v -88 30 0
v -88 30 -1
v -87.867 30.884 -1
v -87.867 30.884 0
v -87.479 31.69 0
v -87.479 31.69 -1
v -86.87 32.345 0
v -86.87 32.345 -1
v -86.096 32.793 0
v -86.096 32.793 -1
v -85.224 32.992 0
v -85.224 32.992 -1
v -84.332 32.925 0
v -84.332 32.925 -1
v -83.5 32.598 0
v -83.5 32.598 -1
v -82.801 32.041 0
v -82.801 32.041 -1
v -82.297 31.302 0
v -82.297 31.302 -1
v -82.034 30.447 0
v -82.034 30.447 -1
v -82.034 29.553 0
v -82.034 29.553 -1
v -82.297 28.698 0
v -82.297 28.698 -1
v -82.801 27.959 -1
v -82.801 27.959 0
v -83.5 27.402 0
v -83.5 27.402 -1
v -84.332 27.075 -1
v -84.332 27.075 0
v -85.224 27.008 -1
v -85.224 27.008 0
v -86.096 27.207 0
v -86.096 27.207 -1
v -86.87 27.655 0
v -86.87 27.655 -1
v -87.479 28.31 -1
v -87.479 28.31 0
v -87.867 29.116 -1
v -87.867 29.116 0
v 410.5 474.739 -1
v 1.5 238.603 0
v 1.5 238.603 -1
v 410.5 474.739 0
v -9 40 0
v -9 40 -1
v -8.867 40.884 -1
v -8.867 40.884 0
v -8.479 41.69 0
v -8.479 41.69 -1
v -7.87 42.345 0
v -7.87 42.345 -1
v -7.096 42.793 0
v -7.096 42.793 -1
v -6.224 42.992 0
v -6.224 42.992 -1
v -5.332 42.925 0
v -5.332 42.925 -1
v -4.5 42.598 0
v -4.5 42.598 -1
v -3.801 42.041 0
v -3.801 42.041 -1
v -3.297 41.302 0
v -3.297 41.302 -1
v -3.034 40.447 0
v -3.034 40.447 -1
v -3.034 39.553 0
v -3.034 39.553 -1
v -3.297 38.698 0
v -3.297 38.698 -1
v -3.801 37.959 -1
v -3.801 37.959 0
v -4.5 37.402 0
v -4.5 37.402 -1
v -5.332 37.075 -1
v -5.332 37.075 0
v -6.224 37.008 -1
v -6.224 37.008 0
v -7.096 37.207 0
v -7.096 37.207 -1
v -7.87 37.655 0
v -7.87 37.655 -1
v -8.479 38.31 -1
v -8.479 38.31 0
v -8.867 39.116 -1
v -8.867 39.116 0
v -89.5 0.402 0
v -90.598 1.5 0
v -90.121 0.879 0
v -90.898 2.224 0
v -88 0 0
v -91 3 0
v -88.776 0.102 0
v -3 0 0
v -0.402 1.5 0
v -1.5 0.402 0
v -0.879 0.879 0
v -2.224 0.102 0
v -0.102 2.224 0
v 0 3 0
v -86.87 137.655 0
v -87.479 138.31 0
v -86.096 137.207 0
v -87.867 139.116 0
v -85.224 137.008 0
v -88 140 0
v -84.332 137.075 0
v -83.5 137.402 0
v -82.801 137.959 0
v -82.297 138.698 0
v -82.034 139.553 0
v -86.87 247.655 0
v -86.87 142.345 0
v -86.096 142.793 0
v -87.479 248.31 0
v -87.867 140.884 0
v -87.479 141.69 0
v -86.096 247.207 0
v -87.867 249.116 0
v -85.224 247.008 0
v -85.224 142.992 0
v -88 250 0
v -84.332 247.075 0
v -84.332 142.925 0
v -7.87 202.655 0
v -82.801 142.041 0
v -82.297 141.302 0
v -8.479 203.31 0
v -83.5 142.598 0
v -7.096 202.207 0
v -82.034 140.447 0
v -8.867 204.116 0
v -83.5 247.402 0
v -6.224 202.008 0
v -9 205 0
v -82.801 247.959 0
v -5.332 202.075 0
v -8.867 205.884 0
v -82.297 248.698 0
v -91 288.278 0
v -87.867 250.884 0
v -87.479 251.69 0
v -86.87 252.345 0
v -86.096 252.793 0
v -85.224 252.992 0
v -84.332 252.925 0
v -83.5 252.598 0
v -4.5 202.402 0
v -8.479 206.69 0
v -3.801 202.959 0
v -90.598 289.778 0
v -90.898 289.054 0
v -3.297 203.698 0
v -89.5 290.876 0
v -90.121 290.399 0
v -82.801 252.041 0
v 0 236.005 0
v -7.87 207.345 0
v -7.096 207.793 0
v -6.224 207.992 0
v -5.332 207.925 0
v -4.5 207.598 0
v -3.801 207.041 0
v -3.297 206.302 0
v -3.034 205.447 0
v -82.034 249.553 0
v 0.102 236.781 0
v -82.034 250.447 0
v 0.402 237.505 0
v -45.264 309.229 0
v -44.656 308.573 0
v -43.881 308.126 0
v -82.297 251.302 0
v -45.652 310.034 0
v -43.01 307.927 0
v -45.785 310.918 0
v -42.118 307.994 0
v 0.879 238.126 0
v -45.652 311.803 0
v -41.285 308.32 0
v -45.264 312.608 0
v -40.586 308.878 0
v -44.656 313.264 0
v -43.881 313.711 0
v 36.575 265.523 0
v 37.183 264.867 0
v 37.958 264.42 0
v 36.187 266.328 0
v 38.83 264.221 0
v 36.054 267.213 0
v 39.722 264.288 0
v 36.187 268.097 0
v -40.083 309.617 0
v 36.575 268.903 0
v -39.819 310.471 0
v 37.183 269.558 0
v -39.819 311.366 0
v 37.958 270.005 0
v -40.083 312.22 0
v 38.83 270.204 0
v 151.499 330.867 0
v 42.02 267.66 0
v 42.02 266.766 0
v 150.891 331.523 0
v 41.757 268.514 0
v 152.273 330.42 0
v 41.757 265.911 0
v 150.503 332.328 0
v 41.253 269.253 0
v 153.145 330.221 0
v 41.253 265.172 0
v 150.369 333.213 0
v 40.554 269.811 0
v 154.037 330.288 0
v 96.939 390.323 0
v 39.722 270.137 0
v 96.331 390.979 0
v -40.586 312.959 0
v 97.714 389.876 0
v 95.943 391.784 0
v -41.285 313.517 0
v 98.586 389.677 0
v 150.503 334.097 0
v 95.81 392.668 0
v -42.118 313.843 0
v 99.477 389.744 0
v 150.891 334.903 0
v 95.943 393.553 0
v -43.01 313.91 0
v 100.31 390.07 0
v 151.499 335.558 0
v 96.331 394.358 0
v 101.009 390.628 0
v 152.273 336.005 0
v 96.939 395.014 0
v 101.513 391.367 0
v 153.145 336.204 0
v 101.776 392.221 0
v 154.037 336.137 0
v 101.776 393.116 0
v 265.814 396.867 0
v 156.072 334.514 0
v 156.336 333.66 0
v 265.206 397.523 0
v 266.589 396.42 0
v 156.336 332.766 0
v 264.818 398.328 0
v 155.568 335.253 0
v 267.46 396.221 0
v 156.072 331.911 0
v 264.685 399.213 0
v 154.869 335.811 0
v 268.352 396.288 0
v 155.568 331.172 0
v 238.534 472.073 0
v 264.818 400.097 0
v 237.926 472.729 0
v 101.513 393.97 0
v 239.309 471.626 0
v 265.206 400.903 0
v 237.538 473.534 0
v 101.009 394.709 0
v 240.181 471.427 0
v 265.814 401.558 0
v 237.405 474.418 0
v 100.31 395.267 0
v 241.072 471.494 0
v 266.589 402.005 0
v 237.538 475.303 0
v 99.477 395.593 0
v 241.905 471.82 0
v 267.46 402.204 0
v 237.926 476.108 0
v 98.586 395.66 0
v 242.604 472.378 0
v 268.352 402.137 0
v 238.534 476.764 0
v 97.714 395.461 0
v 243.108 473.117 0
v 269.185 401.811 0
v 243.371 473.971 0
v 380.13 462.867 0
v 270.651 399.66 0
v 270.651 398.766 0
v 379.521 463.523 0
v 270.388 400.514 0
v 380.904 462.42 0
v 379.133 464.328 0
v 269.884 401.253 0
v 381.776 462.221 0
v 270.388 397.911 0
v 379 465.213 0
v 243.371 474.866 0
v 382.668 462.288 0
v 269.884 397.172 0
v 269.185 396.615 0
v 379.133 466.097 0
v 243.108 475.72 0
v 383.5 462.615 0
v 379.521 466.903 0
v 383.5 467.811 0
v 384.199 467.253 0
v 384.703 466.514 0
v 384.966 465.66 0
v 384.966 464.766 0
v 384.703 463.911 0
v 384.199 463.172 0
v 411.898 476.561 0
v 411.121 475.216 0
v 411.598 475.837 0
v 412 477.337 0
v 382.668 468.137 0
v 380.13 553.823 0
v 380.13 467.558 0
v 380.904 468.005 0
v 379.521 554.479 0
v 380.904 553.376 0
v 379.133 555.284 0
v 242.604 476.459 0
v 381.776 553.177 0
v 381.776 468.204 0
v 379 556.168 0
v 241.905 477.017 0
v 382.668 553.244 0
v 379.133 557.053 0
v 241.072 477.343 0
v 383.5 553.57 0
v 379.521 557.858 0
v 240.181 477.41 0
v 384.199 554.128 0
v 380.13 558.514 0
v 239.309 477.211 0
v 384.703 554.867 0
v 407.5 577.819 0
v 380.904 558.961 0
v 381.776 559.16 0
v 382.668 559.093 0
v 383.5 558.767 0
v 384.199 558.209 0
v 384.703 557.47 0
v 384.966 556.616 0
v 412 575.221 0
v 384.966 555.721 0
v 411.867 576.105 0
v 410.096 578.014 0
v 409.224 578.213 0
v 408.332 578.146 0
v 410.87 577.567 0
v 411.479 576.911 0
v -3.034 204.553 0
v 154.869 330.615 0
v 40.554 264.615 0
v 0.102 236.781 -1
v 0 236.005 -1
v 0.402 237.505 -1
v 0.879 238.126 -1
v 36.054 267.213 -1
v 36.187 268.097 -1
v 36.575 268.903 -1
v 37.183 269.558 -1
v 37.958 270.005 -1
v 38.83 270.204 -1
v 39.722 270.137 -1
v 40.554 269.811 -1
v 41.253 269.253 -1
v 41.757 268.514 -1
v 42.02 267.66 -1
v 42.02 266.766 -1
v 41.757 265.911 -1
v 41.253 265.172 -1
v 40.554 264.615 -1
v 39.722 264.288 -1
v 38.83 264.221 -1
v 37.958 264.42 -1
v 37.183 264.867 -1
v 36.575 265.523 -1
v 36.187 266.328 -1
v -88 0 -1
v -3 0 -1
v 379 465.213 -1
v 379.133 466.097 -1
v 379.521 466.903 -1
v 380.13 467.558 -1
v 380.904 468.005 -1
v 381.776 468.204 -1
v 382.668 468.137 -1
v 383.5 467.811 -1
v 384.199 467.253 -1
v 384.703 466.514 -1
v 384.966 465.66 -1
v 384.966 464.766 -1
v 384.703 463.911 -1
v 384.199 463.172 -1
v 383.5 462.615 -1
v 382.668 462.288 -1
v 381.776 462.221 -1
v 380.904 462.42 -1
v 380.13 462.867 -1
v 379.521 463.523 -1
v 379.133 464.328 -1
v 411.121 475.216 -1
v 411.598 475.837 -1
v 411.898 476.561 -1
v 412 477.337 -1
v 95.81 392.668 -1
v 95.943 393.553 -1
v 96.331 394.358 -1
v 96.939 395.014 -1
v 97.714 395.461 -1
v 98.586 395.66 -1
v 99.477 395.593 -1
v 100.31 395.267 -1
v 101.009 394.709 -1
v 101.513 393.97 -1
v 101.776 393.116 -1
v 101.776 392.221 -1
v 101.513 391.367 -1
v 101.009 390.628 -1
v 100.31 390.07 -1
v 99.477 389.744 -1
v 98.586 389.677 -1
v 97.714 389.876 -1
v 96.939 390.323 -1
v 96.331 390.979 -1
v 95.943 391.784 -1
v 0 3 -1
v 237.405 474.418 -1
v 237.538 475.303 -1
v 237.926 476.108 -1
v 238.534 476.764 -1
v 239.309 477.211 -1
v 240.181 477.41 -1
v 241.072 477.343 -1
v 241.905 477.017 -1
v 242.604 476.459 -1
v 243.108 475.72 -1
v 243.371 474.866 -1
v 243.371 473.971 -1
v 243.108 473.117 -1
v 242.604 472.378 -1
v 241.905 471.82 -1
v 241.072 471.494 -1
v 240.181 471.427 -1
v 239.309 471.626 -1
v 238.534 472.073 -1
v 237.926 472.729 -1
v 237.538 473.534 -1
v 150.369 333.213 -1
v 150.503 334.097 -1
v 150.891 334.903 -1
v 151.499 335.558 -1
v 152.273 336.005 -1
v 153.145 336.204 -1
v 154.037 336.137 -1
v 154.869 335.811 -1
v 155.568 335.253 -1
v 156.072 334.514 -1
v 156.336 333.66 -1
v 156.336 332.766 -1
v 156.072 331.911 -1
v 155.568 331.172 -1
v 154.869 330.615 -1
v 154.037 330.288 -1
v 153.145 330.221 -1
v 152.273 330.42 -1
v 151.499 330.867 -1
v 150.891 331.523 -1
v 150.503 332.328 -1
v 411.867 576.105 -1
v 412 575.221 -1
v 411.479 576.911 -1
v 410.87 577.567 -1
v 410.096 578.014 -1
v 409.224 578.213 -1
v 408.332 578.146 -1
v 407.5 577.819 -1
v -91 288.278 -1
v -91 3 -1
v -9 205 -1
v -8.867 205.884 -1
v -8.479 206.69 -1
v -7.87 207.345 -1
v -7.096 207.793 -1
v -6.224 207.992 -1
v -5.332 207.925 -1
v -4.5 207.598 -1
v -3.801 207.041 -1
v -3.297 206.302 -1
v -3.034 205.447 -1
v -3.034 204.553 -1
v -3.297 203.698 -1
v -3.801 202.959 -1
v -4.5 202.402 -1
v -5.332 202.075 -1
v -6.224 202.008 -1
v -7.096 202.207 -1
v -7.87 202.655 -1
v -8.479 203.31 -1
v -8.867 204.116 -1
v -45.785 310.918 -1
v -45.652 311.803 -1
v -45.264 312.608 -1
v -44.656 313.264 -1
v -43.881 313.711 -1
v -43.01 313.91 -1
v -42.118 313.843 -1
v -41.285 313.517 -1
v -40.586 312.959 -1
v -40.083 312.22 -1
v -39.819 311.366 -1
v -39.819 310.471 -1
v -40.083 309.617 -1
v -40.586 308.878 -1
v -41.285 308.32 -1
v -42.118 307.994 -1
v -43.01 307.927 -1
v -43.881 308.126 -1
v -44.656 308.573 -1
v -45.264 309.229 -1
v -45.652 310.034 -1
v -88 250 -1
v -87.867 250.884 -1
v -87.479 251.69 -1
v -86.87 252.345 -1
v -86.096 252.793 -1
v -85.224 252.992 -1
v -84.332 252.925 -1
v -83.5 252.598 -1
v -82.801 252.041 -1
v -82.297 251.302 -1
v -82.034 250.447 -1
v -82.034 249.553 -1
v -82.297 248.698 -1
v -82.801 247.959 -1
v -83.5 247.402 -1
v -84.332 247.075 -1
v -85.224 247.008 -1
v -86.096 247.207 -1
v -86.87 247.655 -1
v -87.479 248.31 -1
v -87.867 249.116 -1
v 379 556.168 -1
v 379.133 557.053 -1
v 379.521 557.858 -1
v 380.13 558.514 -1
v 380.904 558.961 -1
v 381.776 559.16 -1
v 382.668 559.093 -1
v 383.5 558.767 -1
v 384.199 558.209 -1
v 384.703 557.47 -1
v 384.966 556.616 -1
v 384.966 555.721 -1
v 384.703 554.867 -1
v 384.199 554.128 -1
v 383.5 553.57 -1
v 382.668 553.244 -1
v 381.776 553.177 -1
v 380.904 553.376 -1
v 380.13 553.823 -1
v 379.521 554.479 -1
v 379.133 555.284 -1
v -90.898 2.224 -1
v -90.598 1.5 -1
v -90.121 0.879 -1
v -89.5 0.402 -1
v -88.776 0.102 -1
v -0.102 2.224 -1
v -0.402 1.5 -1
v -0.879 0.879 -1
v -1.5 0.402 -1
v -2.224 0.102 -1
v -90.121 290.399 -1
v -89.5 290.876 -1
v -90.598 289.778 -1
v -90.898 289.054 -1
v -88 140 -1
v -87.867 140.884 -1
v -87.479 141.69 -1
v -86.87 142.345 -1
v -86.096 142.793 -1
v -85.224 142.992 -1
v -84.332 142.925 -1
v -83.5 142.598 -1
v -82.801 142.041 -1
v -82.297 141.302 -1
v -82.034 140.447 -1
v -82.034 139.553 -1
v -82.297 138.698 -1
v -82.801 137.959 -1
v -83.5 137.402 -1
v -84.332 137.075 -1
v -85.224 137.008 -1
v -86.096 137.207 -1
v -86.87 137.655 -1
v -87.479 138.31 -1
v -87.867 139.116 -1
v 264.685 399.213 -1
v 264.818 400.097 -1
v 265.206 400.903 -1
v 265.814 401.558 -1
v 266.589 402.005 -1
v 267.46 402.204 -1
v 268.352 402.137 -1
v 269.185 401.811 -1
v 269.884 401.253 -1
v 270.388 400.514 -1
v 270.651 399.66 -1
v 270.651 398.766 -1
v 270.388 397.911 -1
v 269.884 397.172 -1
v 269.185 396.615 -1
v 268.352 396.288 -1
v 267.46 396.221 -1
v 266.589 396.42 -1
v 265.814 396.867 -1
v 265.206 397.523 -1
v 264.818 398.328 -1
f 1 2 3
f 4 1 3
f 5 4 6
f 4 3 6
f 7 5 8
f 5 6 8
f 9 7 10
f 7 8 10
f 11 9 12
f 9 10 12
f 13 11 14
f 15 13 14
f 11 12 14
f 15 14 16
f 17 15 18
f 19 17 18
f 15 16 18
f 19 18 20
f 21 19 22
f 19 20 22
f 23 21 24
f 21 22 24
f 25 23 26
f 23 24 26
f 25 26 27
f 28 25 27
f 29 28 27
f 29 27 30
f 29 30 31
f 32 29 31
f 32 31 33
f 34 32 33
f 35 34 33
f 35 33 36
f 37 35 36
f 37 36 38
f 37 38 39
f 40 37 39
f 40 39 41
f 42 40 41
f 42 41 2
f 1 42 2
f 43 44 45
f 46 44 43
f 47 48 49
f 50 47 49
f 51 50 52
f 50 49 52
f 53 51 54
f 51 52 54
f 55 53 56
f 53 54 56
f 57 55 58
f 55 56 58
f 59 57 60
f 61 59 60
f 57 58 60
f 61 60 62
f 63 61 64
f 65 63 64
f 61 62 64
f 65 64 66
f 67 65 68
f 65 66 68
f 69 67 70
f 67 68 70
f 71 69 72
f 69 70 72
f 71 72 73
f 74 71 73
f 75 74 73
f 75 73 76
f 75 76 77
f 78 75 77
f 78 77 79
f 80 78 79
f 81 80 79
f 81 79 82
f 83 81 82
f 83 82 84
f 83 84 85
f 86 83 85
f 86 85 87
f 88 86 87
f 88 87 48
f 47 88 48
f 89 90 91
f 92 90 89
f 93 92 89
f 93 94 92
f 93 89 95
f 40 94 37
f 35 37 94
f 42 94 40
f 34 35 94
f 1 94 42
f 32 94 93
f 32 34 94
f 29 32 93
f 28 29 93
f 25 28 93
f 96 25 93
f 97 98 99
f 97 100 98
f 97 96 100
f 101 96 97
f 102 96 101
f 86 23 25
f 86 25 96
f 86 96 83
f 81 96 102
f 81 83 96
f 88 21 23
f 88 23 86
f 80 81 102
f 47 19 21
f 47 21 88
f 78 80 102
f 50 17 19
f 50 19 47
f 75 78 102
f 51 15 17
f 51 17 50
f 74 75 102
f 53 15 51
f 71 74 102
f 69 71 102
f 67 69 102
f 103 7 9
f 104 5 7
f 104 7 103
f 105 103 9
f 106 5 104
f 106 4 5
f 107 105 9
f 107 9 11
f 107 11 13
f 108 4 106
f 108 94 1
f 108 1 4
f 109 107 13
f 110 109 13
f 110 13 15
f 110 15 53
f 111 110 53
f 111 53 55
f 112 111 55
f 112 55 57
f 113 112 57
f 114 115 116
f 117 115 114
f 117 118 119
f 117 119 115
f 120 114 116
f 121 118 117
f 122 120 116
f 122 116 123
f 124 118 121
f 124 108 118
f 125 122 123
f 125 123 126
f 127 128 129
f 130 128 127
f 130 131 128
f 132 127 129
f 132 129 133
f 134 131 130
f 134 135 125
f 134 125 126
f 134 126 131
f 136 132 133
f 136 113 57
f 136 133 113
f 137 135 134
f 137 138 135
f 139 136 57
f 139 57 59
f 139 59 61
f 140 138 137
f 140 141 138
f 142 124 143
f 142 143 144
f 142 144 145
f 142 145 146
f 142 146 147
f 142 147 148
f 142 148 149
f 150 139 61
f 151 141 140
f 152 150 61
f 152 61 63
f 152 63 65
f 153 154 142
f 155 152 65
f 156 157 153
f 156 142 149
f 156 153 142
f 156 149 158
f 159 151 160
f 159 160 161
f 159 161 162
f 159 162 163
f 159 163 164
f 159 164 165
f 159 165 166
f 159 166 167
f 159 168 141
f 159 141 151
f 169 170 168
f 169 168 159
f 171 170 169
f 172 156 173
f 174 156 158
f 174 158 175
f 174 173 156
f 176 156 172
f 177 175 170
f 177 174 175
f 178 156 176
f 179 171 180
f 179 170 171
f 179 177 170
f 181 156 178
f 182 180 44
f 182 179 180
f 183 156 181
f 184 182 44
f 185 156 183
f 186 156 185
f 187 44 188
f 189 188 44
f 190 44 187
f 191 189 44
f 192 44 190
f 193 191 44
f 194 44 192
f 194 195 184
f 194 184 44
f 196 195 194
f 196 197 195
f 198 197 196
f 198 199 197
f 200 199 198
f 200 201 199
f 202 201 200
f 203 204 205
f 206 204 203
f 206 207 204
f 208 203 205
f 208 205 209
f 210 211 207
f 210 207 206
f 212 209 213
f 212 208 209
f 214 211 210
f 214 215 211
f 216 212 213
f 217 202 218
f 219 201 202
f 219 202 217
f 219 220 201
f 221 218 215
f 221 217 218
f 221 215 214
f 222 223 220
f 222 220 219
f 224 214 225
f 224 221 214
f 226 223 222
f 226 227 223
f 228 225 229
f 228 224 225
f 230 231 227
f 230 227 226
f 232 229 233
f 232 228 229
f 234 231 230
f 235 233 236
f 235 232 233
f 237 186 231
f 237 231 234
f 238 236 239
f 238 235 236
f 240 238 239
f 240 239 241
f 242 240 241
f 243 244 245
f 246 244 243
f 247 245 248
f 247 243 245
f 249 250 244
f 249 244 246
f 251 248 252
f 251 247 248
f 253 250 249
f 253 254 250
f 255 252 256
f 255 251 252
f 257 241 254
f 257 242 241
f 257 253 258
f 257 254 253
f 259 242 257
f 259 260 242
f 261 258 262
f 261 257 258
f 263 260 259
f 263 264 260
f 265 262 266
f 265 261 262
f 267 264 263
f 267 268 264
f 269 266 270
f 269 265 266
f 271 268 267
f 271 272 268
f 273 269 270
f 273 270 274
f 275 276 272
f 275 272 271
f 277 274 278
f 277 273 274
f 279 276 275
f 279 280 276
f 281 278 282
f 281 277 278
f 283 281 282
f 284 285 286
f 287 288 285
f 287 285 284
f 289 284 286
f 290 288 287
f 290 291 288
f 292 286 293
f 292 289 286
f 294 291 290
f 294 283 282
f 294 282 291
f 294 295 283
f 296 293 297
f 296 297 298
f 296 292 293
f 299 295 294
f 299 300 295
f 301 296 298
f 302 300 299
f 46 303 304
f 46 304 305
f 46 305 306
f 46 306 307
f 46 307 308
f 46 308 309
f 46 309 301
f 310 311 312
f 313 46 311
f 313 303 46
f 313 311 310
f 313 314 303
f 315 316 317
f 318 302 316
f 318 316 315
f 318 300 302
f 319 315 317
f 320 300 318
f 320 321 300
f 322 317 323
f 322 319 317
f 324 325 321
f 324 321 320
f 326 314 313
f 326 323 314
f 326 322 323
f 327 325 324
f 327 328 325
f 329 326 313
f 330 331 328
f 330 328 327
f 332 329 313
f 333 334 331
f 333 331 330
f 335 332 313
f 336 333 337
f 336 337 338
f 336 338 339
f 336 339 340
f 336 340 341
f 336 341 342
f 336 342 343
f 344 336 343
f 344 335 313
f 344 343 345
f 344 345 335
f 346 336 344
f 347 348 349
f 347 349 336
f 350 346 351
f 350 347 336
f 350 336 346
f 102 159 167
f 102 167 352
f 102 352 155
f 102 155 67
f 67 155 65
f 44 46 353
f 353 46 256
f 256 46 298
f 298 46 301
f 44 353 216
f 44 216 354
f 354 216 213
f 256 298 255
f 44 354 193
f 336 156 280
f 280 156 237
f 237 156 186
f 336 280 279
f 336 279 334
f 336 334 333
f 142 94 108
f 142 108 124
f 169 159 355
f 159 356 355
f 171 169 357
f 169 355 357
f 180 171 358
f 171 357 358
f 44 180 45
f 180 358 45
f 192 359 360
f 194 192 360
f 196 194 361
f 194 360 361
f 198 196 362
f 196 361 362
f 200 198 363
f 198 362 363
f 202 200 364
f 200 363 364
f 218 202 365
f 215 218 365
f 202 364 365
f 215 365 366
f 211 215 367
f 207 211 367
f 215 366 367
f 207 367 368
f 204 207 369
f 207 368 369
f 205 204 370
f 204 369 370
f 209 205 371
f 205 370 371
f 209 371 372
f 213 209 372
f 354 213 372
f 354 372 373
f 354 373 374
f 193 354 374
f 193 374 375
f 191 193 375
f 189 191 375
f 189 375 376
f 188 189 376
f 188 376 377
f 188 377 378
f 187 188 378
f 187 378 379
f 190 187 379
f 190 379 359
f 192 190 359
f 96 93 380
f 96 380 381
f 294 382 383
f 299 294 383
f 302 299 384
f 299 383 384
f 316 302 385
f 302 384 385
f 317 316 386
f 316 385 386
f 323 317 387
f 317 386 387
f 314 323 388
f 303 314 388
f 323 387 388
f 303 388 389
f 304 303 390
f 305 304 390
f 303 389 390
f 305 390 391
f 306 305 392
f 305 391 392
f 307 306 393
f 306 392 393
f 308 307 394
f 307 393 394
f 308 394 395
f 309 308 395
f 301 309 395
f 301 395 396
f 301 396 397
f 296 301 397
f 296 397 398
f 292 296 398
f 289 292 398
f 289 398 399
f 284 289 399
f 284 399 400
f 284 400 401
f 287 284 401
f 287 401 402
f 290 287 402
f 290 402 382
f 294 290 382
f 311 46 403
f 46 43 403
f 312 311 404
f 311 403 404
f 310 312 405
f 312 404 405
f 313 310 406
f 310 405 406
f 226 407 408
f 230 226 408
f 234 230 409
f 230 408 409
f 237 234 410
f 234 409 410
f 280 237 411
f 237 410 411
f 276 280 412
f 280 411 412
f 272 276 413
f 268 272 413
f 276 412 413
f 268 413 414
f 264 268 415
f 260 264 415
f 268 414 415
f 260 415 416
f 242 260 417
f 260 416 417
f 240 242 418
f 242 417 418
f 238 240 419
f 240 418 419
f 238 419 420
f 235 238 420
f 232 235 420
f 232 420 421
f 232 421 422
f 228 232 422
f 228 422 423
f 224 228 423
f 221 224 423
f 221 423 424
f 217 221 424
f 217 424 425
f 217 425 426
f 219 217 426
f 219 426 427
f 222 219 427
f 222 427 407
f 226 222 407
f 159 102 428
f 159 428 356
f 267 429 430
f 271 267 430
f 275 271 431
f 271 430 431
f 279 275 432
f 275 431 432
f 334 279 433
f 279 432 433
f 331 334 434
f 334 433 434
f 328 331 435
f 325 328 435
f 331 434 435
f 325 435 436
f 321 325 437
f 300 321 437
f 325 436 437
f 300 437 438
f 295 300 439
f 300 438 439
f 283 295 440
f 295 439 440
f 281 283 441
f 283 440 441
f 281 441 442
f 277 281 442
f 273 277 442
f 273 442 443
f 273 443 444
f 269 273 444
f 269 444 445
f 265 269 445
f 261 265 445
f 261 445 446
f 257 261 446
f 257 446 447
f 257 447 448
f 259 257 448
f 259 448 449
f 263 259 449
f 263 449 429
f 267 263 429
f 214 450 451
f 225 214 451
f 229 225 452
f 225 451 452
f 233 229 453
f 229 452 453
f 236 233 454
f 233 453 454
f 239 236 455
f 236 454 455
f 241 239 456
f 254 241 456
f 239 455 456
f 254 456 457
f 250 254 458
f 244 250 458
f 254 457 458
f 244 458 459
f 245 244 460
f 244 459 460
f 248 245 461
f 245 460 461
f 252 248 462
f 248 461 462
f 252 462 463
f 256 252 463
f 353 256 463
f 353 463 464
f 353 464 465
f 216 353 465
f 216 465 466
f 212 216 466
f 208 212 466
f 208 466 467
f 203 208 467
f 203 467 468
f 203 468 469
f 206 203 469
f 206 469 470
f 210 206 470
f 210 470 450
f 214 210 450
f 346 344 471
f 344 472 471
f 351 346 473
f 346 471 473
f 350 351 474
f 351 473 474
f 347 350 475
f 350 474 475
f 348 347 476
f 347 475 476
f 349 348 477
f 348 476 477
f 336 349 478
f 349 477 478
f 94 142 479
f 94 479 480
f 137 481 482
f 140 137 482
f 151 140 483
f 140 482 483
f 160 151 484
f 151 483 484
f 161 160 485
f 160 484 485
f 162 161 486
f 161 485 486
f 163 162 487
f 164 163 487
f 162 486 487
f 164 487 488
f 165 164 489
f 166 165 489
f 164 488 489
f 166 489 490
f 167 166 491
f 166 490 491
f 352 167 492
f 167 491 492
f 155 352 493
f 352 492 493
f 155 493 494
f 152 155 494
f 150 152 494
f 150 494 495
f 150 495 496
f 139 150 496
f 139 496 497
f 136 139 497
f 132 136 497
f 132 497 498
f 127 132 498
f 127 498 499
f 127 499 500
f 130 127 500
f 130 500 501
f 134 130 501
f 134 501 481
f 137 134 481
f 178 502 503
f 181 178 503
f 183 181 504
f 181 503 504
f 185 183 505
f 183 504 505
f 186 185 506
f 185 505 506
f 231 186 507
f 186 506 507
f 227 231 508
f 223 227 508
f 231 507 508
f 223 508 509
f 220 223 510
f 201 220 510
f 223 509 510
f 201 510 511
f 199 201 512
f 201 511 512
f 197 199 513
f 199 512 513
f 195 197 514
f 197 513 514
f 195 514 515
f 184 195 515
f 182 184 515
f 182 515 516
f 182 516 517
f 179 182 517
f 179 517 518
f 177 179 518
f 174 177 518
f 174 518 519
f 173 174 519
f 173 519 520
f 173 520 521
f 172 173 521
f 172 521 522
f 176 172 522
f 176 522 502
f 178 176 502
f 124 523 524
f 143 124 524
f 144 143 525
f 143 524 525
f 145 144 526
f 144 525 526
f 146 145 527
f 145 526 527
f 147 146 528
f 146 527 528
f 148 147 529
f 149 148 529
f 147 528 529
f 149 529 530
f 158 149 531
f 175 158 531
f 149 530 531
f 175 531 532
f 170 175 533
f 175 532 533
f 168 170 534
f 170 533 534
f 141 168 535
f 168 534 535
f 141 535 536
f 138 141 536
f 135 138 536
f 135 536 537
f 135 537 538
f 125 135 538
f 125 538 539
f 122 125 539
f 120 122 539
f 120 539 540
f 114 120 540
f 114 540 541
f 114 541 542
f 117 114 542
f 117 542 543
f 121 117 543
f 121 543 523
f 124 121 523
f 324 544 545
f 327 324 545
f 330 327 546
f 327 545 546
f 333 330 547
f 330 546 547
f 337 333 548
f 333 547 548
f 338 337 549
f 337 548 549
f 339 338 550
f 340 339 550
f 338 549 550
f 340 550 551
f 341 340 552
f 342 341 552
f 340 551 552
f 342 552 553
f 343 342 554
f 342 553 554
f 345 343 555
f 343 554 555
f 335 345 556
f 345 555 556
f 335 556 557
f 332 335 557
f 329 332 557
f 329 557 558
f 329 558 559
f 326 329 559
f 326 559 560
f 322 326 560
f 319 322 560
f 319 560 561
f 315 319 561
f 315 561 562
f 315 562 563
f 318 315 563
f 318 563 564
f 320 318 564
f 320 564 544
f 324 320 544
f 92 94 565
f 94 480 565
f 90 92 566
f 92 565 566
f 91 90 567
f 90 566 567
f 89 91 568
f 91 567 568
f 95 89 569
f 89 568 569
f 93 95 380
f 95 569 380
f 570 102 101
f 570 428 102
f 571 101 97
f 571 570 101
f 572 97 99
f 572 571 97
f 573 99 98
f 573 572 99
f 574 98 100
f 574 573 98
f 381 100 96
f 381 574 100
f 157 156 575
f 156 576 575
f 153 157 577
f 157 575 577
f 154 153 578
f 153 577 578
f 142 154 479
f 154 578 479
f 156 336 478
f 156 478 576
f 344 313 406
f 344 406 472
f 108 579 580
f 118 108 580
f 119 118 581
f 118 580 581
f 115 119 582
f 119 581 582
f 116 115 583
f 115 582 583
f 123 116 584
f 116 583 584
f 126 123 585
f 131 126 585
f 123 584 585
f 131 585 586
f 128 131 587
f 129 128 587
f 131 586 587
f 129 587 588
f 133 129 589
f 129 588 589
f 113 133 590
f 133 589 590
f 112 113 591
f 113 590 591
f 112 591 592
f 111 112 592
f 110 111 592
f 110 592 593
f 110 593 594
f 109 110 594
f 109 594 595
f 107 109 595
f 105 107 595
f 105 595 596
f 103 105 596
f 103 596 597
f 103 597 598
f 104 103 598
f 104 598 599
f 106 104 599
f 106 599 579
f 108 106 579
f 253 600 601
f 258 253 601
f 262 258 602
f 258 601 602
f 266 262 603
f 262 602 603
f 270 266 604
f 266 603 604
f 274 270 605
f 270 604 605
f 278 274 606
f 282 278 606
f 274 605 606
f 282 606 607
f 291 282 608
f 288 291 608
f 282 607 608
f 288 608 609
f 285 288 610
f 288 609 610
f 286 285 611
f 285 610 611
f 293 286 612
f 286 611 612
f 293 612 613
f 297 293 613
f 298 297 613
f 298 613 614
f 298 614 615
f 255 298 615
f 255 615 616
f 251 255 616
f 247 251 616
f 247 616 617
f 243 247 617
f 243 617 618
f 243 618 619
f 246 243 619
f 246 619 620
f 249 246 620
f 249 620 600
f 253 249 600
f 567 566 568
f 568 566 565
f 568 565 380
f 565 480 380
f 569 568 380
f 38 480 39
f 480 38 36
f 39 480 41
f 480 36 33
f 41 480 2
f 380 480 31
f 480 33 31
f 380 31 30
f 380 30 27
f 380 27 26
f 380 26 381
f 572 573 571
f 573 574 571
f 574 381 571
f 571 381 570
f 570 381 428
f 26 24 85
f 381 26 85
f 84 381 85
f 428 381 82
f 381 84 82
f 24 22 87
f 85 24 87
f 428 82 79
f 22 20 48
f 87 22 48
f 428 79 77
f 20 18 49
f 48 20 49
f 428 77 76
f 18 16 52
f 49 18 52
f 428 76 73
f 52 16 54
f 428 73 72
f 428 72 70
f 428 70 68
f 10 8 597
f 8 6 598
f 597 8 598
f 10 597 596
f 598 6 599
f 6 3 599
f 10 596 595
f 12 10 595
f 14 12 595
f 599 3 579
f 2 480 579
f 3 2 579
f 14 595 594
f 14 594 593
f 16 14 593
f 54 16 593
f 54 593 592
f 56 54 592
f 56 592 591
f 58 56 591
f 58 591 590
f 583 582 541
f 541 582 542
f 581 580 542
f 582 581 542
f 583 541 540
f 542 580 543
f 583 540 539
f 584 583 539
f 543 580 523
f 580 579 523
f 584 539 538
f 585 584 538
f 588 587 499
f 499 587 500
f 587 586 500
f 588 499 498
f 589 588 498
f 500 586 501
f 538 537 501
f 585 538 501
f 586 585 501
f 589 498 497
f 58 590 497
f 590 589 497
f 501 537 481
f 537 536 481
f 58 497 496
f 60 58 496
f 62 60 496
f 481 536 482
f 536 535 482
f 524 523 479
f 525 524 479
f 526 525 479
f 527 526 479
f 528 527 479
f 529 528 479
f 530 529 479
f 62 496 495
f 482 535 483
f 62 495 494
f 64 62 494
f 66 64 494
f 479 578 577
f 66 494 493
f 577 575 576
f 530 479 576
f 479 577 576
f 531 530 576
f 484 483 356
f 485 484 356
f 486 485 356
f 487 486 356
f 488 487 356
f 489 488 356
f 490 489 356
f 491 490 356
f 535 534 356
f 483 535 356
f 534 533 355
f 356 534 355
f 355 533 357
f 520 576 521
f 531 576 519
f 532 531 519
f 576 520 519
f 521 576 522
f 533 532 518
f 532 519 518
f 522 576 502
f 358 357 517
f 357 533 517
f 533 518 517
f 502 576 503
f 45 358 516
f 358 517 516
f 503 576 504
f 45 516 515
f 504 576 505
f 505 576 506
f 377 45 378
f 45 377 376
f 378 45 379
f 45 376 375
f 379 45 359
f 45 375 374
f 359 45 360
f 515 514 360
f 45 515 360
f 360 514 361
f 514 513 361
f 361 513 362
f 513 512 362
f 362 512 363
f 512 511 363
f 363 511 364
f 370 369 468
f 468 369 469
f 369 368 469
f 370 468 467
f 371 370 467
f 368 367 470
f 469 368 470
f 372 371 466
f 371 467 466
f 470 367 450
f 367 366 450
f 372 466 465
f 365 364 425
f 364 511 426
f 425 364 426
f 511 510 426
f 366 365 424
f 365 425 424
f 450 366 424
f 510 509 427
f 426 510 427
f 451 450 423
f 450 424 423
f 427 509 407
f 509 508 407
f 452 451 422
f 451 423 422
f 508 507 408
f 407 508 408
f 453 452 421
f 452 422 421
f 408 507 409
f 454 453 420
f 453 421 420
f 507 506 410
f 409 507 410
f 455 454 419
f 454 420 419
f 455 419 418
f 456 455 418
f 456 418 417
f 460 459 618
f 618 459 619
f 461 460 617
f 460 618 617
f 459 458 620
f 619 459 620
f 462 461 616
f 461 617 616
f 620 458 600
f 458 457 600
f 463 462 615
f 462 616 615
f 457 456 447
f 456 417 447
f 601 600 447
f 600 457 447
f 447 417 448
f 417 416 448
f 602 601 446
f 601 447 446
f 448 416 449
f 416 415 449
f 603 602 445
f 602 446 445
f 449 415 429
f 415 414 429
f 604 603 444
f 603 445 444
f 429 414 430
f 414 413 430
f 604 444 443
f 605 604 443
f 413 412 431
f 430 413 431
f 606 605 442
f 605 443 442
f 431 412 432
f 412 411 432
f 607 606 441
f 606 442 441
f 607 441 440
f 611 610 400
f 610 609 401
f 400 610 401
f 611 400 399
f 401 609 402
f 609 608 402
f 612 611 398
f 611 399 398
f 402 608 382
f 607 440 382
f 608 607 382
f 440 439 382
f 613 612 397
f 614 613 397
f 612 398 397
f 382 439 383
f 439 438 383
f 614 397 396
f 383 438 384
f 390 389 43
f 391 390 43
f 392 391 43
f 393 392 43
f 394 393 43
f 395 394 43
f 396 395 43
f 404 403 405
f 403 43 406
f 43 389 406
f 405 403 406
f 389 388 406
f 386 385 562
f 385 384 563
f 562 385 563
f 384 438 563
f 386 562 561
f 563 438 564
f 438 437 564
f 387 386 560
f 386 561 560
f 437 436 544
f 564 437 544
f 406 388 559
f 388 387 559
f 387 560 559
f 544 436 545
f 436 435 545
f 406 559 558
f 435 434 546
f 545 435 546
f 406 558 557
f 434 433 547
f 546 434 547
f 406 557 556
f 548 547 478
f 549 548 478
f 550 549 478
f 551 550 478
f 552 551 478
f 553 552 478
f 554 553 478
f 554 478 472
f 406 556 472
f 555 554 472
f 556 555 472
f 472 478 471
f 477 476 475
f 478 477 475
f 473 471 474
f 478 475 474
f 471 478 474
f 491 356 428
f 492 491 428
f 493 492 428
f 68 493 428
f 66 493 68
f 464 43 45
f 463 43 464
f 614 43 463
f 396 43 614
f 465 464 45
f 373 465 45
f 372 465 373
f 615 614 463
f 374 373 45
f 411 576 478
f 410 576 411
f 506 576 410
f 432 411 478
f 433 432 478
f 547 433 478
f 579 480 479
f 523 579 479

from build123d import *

# Parameters (mm, degrees)
BASE_FLANGE1_DEPTH = 1
FILLET1_R          = 3
SKETCH2_R          = 3
CUT_EXTRUDE1_DEPTH = 10


# Sheet-metal steps are written as plain solids
with BuildPart() as part:
    # Sketch1 → Base-Flange1 (new body)
    with BuildSketch(Plane.XY):
        Polygon((0, 0), (0, 237.736706628), (412, 475.605017534), (412, 580.417185402), (-91, 290.01), (-91, 0), align=None)
    extrude(amount=-BASE_FLANGE1_DEPTH)

    # Fillet1
    fillet1_edges = [part.edges().sort_by_distance(p)[0] for p in [
        (-91, 0, -0.5),
        (-91, 290.01, -0.5),
        (412, 580.417185402, -0.5),
        (412, 475.605017534, -0.5),
        (0, 237.736706628, -0.5),
        (0, 0, -0.5),
    ]]
    fillet(fillet1_edges, radius=FILLET1_R)

    # Sketch2 → Cut-Extrude1 (cut)
    with BuildSketch(Plane(origin=(0, 0, -1), x_dir=(-1, 0, 0), z_dir=(0, 0, -1))):
        with Locations((-382, 556.168474096)):
            Circle(SKETCH2_R)
        with Locations((-240.404846481, 474.418474096)):
            Circle(SKETCH2_R)
        with Locations((-98.809692962, 392.668474096)):
            Circle(SKETCH2_R)
        with Locations((42.785460556, 310.918474096)):
            Circle(SKETCH2_R)
        with Locations((-382, 465.212712688)):
            Circle(SKETCH2_R)
        with Locations((-267.6846467, 399.212712688)):
            Circle(SKETCH2_R)
        with Locations((-153.369293401, 333.212712688)):
            Circle(SKETCH2_R)
        with Locations((-39.053940101, 267.212712688)):
            Circle(SKETCH2_R)
        with Locations((85, 30)):
            Circle(SKETCH2_R)
        with Locations((6, 40)):
            Circle(SKETCH2_R)
        with Locations((85, 140)):
            Circle(SKETCH2_R)
        with Locations((85, 250)):
            Circle(SKETCH2_R)
        with Locations((6, 205)):
            Circle(SKETCH2_R)
    extrude(amount=-CUT_EXTRUDE1_DEPTH, mode=Mode.SUBTRACT)


solid = part.part
